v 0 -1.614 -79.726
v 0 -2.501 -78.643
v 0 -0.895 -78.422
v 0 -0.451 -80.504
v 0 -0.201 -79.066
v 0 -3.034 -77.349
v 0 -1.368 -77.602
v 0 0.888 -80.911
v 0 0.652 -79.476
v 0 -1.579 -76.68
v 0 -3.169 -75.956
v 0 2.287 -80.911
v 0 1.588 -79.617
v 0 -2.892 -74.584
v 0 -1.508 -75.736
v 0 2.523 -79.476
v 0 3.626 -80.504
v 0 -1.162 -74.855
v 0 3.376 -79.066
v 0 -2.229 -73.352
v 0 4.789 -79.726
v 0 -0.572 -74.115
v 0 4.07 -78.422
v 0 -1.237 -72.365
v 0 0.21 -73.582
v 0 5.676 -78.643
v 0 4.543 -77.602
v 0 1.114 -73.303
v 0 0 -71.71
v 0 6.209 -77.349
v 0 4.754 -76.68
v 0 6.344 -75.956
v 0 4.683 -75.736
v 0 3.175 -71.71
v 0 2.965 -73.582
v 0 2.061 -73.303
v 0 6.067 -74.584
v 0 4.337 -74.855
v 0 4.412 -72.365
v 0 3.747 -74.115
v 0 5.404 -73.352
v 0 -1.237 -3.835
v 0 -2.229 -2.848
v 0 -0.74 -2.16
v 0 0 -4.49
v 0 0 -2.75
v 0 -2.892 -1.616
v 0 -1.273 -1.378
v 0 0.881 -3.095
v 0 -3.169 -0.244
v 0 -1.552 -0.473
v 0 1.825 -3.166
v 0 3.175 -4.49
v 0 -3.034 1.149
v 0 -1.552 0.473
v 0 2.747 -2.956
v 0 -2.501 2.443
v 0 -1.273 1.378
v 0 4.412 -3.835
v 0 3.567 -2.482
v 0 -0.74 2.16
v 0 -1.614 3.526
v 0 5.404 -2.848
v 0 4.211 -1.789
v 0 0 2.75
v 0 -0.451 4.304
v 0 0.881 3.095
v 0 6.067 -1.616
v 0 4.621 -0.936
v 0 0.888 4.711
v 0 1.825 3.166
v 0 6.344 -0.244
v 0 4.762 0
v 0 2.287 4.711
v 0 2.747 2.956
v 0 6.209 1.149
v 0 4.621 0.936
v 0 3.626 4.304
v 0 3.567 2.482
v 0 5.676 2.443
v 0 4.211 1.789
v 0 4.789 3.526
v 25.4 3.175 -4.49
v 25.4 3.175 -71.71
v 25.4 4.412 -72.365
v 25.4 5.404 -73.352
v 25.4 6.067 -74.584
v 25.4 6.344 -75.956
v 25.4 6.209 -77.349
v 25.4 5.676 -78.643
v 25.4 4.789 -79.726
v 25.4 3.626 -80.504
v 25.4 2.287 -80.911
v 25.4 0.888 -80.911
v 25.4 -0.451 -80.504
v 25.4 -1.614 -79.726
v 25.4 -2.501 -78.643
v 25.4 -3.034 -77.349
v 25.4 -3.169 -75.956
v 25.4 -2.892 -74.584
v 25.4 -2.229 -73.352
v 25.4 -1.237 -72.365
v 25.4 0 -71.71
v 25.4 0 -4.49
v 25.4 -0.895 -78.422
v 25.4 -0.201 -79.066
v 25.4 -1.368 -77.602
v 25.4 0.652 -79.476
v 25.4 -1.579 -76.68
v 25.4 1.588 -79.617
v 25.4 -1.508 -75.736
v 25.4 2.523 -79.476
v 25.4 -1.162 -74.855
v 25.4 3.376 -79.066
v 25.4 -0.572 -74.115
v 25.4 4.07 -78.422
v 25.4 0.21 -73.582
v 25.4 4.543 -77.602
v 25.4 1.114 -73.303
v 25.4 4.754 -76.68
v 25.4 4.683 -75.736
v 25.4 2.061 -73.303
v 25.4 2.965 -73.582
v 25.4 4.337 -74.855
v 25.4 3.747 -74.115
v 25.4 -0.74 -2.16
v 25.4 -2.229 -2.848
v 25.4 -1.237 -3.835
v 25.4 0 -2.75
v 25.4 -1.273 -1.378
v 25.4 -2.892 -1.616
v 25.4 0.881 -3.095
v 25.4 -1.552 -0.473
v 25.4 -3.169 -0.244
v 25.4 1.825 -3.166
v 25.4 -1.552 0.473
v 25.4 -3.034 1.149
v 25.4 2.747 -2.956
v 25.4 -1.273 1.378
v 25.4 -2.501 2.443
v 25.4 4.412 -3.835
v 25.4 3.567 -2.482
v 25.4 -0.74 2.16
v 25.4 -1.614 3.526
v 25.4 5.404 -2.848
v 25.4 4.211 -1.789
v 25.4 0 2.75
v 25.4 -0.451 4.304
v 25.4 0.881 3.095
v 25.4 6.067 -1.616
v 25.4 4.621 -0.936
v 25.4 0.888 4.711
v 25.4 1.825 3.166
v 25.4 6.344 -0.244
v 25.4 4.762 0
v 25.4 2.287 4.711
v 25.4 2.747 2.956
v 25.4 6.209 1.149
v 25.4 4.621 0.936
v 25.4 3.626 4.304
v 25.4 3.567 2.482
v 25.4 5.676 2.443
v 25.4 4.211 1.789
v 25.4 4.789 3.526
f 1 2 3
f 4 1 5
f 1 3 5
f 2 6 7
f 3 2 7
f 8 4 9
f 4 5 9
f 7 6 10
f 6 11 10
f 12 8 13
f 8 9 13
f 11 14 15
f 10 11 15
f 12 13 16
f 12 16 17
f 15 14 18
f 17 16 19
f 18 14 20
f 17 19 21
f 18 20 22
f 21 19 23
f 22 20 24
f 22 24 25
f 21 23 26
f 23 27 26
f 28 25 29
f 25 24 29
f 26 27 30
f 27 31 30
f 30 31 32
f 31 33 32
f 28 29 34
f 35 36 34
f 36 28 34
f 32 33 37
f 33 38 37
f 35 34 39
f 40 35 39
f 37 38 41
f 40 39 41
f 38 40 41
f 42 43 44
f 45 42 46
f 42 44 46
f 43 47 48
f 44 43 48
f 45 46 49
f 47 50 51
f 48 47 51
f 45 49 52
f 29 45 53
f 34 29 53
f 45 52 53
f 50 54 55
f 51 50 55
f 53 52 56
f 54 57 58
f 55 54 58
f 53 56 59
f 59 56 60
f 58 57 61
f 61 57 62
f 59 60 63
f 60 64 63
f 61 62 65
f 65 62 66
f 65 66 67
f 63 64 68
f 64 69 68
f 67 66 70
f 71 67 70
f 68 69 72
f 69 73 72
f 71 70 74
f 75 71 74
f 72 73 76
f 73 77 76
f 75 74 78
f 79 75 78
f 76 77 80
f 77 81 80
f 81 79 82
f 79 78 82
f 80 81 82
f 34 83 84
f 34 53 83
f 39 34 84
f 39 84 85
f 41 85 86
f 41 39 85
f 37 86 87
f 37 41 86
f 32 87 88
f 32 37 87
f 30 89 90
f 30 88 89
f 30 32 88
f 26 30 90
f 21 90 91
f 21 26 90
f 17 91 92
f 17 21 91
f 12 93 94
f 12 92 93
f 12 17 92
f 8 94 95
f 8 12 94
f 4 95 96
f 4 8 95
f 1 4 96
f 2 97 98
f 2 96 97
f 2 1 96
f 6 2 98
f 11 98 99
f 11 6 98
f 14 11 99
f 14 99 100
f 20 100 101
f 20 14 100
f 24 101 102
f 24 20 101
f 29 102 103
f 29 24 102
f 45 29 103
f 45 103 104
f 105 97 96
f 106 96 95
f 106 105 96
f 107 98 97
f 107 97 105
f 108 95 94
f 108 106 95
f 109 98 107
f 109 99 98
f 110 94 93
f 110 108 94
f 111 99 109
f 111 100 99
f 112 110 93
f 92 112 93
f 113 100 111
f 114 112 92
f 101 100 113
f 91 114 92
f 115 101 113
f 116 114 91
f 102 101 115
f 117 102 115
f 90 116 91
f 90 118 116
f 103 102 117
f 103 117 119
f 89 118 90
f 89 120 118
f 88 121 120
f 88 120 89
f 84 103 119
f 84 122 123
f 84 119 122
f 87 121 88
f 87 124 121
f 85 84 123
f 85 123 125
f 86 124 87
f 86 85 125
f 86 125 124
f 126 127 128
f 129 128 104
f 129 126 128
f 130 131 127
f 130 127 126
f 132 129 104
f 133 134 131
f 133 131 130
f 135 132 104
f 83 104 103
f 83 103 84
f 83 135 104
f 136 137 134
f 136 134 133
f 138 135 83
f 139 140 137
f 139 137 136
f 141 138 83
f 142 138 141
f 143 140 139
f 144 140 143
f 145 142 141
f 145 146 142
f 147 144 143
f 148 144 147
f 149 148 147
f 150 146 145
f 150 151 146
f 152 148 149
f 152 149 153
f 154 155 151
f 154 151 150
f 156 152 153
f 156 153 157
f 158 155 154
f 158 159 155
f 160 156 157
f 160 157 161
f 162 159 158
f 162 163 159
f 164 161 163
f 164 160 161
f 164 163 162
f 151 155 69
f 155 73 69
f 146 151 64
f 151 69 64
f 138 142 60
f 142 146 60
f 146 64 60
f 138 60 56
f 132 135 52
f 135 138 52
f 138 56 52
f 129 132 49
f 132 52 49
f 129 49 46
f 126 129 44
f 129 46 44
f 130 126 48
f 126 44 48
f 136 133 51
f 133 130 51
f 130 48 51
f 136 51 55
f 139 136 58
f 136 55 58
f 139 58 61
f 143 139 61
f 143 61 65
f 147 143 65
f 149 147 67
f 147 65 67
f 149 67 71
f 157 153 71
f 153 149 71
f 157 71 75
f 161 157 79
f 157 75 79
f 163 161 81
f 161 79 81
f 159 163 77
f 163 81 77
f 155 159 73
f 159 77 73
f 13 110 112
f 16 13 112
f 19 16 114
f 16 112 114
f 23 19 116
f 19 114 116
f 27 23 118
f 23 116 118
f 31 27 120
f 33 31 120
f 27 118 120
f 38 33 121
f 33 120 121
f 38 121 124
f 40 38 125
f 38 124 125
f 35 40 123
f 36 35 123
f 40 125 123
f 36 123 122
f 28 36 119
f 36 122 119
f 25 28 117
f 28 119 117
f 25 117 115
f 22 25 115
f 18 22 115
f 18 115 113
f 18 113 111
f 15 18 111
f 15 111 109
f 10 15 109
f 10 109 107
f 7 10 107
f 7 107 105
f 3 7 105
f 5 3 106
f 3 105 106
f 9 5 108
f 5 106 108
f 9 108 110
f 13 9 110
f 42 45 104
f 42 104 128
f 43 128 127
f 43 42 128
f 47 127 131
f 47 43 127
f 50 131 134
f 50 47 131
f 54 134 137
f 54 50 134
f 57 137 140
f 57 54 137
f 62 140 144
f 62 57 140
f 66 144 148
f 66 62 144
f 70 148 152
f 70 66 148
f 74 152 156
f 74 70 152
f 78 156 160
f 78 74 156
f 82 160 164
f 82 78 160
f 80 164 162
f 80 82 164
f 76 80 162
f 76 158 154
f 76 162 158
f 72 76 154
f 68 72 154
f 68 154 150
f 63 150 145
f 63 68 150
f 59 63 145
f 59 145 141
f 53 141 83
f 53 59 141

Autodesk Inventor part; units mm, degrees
ref_plane "YZ Plane" through (0, 0, 0) normal (1, 0, 0) x (0, 1, 0)
ref_plane "XZ Plane" through (0, 0, 0) normal (0, 1, 0) x (-1, 0, 0)
ref_plane "XY Plane" through (0, 0, 0) normal (0, 0, 1) x (1, 0, 0)
sketch "Sketch1" plane through (0, 0, 0) normal (1, 0, 0) x (0, 1, 0)
  line L0 (3.175, -4.4901) -> (3.175, -71.7099)
  line L1 (0, -71.7099) -> (0, -4.4901)
  arc A0 (3.175, -4.4901) -> (0, -4.4901) centre (1.5875, 0) ccw
  circle A1 centre (1.5875, 0) radius 3.175
  circle A2 centre (1.5875, -76.2) radius 3.175
  arc A3 (0, -71.7099) -> (3.175, -71.7099) centre (1.5875, -76.2) ccw
  point P0 (0, 0)
  point P1 (0, -73.4504)
  dimension "d7" = 6.35
  dimension "d0" = 3.175
  dimension "d2" = 6.35
  dimension "d3" = 1.5875
  dimension "d6" = 1.5875
extrude "Extrusion1" add sketch "Sketch1" along normal blind 25.4 contours L0 A3 L1 A0 | A2
sketch "Sketch2" plane through (25.4, 0, 0) normal (1, 0, 0) x (0, 0, -1)
  circle A0 centre (76.4423, 1.5875) radius 3.175
  arc A1 (71.7099, 0) -> (71.7099, 3.175) centre (76.2, 1.5875) ccw projected
  point P0 (0, 0)
  dimension "d8" = 0
  dimension "d9" = 6.35
extrude "Extrusion2" cut sketch "Sketch2" against normal through all
properties part number "aimingrails" material "Aluminum 6061"
